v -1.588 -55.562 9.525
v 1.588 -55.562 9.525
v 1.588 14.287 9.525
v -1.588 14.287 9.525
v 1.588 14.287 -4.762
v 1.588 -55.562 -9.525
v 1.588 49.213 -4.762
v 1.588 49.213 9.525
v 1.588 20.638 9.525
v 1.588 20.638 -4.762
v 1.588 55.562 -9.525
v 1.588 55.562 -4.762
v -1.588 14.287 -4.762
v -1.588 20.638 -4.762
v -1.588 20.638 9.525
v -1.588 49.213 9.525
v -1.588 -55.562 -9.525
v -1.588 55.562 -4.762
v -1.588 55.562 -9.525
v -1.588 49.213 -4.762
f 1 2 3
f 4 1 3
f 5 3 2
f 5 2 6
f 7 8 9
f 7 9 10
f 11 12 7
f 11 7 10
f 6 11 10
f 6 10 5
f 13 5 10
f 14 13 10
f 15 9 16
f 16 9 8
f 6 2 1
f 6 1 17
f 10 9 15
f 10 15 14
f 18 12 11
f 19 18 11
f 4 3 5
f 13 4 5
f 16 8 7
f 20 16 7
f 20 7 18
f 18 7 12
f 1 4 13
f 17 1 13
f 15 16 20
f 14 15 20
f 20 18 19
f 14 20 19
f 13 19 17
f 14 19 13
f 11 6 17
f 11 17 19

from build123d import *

# Parameters (mm, degrees)
SKETCH1_W           = 19.05
SKETCH1_H           = 111.125
BOSS_EXTRUDE1_DEPTH = 1.5875
SKETCH2_W           = 14.2875
SKETCH2_H           = 6.35
CUT_EXTRUDE1_DEPTH  = 4.175


with BuildPart() as part:
    # Sketch1 → Boss-Extrude1 (new body, symmetric)
    with BuildSketch(Plane(origin=(0, 0, 0), x_dir=(0, 0, -1), z_dir=(1, 0, 0))):
        Rectangle(SKETCH1_W, SKETCH1_H)
    extrude(amount=BOSS_EXTRUDE1_DEPTH, both=True)

    # Sketch2 → Cut-Extrude1 (cut, through all)
    with BuildSketch(Plane(origin=(1.5875, 0, 0), x_dir=(0, 0, -1), z_dir=(1, 0, 0))):
        with Locations((-2.38125, 52.3875)):
            Rectangle(SKETCH2_W, SKETCH2_H)
        with Locations((-2.38125, 17.4625)):
            Rectangle(SKETCH2_W, SKETCH2_H)
    extrude(amount=-CUT_EXTRUDE1_DEPTH, mode=Mode.SUBTRACT)


solid = part.part
